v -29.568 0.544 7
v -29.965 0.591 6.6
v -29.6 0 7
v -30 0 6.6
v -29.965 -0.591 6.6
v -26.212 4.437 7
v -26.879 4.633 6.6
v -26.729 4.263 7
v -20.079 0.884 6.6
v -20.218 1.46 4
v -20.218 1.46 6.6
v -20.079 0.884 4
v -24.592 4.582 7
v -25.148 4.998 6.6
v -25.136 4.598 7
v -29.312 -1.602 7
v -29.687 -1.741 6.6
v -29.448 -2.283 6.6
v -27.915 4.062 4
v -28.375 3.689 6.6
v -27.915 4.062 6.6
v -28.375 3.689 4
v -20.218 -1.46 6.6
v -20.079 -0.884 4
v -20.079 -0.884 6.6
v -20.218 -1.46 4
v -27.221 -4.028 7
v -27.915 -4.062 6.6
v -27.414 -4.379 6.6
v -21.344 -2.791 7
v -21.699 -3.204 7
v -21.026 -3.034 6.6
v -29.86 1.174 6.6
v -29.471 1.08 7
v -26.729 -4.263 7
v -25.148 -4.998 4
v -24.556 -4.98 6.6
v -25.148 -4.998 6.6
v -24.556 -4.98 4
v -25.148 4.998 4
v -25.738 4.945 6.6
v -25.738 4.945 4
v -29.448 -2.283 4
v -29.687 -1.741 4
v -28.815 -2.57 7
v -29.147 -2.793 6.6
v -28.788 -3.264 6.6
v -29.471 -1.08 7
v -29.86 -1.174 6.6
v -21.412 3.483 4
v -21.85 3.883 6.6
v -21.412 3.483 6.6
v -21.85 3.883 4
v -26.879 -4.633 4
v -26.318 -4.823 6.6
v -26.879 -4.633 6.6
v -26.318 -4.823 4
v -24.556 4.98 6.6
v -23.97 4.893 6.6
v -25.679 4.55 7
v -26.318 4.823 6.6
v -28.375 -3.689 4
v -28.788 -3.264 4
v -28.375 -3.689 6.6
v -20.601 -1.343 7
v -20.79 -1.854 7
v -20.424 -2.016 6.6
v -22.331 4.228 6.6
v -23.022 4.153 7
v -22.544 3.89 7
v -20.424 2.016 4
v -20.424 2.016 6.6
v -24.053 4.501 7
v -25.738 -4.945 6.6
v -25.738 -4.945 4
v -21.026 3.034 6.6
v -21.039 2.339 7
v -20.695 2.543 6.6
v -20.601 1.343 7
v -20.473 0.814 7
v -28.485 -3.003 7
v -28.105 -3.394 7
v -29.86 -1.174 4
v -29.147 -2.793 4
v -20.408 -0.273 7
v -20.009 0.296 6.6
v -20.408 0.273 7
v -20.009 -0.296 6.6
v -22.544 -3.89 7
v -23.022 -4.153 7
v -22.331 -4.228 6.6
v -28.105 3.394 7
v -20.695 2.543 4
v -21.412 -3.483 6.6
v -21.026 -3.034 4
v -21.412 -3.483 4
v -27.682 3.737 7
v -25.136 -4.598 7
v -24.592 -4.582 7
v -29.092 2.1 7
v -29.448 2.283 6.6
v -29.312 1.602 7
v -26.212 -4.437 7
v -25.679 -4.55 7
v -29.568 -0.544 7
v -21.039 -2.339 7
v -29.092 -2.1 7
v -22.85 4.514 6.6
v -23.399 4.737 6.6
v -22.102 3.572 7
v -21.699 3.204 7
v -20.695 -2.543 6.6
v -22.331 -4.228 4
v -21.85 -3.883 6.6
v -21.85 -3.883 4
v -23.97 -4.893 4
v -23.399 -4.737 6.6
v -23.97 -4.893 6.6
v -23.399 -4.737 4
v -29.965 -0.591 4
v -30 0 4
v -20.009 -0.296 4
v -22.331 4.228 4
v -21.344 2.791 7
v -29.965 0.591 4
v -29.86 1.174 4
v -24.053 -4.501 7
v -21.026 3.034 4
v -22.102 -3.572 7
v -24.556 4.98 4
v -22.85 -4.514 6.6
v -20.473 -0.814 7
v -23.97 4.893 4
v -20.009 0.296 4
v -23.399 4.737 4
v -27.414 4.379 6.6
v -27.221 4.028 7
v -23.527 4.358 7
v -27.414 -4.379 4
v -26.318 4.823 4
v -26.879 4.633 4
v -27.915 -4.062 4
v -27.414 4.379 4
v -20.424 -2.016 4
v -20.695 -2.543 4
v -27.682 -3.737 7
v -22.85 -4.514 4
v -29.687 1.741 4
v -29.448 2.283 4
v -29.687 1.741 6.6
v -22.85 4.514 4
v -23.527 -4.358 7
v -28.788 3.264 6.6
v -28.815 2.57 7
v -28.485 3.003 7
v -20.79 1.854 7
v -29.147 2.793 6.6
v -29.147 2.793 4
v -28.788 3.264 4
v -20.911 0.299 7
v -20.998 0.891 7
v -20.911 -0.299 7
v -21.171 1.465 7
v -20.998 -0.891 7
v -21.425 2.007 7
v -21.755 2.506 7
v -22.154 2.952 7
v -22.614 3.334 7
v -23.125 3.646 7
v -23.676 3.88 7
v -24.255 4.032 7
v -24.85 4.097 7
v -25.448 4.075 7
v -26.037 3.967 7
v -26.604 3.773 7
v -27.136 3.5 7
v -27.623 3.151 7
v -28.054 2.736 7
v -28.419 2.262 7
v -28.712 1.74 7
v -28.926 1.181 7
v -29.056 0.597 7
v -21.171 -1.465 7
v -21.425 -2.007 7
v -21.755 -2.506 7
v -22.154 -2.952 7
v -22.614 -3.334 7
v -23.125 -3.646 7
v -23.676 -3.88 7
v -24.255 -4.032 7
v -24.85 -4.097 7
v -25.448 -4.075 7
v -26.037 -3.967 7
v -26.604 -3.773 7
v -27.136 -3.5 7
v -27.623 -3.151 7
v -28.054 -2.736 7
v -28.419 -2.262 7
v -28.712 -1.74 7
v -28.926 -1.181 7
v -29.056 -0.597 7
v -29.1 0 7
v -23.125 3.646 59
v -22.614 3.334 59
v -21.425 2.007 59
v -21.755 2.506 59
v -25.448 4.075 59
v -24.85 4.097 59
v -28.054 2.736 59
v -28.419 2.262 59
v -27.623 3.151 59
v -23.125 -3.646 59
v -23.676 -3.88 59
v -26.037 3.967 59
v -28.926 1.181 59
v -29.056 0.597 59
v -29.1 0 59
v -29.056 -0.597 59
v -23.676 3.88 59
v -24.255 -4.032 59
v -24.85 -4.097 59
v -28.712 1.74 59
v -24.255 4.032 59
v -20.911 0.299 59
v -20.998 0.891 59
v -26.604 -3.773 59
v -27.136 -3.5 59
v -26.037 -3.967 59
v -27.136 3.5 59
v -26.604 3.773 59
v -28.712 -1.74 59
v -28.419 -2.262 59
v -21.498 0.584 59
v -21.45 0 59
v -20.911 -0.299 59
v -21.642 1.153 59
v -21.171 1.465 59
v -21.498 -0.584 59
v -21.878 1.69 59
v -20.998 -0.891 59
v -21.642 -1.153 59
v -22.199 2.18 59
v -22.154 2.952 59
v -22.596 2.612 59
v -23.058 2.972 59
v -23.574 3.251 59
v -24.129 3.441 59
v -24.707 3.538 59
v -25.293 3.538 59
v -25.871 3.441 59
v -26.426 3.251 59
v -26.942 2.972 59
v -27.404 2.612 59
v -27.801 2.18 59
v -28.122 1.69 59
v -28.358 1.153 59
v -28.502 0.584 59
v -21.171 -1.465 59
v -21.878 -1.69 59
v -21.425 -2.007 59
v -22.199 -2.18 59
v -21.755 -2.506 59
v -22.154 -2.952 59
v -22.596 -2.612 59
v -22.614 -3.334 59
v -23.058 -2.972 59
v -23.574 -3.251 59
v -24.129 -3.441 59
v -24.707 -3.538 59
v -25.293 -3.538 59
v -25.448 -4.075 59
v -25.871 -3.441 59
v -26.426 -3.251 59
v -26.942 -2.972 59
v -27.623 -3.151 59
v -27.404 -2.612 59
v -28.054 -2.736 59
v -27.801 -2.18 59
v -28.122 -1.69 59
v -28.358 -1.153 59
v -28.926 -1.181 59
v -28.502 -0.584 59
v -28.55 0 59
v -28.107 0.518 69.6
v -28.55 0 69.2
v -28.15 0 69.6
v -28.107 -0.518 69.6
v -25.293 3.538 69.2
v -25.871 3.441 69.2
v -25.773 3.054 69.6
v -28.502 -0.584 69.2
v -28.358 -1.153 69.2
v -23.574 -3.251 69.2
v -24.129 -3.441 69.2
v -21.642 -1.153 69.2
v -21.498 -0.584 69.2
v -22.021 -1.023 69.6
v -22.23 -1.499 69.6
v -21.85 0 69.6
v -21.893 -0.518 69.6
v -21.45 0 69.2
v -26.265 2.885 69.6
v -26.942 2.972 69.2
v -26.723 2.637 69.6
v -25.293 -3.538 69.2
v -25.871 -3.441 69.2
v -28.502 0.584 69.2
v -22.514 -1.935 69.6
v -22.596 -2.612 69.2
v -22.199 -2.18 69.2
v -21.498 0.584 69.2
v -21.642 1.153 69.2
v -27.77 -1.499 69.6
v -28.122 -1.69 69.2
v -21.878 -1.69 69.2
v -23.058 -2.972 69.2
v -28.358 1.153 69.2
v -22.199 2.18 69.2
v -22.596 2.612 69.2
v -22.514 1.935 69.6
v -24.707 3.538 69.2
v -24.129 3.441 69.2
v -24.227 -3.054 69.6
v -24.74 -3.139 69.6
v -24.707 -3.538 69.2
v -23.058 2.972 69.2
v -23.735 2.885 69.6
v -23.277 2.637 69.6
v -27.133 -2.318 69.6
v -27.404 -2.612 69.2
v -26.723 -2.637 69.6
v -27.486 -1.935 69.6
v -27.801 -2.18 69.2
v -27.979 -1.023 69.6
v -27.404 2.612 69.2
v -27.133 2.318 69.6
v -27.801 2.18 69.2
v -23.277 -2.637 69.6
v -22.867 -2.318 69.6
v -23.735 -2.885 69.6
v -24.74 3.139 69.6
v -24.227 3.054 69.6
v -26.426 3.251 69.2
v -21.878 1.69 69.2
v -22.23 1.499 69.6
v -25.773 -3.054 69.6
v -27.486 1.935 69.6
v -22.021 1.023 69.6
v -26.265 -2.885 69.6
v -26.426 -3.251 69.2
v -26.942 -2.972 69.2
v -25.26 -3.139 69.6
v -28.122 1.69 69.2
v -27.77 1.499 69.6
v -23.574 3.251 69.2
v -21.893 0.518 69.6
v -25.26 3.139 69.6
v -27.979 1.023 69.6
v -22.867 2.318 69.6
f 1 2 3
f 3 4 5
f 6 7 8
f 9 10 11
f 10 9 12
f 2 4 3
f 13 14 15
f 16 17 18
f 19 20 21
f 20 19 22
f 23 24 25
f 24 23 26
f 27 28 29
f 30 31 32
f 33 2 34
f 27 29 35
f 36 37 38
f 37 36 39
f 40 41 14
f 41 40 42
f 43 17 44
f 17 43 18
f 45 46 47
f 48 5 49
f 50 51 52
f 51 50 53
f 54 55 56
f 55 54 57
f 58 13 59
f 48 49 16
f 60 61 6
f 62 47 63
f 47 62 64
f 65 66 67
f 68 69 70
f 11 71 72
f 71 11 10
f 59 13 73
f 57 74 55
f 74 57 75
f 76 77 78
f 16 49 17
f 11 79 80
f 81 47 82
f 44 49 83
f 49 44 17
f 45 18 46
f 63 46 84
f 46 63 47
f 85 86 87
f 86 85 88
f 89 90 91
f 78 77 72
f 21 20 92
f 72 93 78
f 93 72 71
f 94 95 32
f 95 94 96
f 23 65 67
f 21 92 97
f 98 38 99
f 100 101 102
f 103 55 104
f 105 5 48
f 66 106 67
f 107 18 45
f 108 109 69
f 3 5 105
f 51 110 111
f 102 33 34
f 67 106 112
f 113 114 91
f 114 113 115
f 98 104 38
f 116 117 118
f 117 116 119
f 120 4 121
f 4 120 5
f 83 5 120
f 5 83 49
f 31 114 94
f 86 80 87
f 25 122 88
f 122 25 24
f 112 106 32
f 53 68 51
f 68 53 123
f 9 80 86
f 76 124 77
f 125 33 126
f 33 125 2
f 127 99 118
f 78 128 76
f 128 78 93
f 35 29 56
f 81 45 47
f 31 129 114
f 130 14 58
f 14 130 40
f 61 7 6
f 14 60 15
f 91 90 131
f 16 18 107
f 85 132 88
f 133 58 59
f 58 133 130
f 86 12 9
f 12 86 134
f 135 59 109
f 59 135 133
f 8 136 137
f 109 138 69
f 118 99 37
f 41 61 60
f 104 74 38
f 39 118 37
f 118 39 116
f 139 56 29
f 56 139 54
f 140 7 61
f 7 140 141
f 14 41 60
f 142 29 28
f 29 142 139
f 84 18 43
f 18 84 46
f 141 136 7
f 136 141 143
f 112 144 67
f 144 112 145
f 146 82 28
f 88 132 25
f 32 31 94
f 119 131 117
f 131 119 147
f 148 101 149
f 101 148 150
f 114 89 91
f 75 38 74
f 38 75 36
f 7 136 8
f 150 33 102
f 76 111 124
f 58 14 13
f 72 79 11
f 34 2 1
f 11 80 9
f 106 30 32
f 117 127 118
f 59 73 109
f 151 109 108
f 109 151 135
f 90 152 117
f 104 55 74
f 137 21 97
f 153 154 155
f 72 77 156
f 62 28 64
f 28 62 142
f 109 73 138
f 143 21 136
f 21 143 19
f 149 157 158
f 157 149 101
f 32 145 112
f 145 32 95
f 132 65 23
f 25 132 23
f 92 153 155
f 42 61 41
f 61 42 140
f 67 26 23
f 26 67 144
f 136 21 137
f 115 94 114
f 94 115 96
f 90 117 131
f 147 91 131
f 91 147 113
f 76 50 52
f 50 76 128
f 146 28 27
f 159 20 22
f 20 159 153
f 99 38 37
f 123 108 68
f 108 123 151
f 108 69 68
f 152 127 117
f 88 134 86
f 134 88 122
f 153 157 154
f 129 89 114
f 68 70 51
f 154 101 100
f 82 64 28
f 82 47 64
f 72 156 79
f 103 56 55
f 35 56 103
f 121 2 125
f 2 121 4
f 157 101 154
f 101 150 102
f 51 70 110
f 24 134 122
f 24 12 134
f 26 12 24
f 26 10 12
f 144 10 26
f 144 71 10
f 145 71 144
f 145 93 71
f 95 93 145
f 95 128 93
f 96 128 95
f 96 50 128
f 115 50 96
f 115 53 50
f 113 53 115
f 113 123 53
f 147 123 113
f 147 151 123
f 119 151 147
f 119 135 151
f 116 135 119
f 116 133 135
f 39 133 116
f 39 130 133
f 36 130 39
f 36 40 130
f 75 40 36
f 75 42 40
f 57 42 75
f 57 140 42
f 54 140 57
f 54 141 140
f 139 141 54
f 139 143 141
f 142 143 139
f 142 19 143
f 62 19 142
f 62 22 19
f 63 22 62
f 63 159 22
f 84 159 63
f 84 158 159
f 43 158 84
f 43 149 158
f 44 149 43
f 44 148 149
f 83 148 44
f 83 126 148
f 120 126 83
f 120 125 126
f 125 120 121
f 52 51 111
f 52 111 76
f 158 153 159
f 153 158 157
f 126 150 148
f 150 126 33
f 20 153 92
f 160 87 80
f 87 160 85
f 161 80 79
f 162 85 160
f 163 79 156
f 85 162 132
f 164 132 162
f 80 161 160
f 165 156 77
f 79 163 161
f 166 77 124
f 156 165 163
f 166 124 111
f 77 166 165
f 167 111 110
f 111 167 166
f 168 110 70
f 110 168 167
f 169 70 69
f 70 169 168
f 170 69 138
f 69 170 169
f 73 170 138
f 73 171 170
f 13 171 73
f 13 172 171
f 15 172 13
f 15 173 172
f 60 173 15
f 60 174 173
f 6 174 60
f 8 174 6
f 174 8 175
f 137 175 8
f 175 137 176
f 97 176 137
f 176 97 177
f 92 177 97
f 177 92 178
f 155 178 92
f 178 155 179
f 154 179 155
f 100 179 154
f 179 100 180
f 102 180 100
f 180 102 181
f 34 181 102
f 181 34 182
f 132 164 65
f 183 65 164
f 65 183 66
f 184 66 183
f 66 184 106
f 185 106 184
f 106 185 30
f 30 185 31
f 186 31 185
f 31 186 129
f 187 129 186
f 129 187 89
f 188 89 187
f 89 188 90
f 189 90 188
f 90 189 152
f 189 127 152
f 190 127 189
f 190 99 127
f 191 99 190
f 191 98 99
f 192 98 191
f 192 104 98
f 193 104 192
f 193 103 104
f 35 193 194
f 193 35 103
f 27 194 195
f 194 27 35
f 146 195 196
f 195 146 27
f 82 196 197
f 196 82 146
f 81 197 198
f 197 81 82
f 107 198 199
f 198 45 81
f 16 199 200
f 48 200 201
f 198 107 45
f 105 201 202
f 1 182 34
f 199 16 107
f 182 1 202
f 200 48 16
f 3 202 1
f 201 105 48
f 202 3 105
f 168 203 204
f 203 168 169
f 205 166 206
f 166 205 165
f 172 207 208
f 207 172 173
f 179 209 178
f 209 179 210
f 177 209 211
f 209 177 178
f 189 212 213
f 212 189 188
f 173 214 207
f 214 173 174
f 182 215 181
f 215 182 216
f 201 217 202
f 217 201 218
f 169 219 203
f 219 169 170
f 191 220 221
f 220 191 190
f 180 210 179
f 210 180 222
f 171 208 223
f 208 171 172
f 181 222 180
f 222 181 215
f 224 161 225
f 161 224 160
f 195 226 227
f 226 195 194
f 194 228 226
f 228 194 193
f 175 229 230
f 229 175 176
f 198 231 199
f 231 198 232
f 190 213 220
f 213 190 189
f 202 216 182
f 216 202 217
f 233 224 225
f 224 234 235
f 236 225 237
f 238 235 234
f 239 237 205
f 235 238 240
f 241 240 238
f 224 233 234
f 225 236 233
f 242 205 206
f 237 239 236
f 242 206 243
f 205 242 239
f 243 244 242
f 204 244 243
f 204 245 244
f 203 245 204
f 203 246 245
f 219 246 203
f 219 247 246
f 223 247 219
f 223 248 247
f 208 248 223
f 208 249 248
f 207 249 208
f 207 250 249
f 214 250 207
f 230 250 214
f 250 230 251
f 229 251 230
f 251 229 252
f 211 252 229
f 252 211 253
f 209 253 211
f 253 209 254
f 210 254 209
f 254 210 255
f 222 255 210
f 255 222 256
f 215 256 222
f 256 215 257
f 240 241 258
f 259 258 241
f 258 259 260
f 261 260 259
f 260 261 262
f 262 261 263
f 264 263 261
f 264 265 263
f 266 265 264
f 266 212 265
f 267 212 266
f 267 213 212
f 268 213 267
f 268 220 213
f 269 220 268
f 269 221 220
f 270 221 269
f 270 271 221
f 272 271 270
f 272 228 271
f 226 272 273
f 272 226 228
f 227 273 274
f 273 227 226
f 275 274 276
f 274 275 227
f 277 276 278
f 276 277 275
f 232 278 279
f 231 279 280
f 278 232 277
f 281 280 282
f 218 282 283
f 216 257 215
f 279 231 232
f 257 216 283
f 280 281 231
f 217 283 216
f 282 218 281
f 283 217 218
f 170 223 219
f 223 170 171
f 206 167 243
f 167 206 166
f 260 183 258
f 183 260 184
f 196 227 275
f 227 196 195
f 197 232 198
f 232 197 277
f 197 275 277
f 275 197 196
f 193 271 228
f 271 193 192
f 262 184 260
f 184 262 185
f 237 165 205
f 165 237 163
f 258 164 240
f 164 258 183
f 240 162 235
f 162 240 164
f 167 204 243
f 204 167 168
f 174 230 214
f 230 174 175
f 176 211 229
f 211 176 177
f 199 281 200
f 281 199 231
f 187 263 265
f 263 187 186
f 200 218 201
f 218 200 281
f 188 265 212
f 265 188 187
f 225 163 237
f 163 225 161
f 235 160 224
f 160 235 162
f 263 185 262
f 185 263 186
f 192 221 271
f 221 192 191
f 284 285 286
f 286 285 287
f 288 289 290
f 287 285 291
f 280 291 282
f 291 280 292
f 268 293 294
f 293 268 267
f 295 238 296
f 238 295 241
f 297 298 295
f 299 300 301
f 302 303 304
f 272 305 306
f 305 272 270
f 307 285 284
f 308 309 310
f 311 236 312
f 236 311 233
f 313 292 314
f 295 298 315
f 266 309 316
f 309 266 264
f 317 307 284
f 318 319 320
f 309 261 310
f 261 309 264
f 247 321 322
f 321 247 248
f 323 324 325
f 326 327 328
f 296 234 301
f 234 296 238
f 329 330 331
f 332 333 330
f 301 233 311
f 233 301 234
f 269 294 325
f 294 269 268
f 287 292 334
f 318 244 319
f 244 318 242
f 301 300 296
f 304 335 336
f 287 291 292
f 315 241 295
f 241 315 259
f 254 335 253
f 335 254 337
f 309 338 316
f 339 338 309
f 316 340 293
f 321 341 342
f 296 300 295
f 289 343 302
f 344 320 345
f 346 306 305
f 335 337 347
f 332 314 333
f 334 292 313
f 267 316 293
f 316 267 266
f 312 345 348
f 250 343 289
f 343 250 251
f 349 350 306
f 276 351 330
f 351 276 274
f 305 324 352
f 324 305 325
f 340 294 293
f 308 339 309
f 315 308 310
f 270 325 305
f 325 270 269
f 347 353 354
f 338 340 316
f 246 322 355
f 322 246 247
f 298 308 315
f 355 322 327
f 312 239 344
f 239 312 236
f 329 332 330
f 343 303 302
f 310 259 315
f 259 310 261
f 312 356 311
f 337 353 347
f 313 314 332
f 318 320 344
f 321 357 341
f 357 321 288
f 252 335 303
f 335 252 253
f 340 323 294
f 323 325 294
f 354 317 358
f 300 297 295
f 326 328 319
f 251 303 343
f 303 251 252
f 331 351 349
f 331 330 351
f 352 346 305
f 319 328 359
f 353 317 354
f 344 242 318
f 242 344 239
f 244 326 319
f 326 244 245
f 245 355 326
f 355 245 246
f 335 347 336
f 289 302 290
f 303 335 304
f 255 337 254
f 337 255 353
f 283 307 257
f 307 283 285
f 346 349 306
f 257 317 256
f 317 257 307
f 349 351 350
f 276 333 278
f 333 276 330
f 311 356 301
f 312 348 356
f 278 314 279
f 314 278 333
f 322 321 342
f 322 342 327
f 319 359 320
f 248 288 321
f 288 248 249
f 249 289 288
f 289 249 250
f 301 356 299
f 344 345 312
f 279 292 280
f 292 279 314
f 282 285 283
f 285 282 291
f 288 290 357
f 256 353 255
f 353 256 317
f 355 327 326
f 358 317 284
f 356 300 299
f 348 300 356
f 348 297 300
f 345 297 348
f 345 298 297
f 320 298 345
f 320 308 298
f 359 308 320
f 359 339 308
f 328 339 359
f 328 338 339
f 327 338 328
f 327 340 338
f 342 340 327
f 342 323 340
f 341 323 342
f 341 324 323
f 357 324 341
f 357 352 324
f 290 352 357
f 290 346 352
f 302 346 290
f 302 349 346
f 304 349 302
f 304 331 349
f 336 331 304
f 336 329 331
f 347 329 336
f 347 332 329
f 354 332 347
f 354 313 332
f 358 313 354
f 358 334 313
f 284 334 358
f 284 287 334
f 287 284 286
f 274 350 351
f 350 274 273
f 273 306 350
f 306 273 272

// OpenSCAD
// file: ../drive_lib.scad
// ============================================================================
//  Вспомогательные модули модуля вращения (шкивы).
//  Подключать через use <../drive_lib.scad>.
// ============================================================================

include <drive_params.scad>
use <../lib/common.scad>

// Канавка под квадратный пассик: трапеция со дном чуть шире пассика и
// разведёнными стенками — пассик сам садится на дно.
module sq_belt_groove(od) {
    wb = belt_t + 0.2;
    wt = wb/2 + (pulley_groove_h + 0.5)*tan(30);
    rotate_extrude(angle = 360) polygon([
        [od/2 - pulley_groove_h, -wb/2],
        [od/2 - pulley_groove_h,  wb/2],
        [od/2 + 0.5,  wt],
        [od/2 + 0.5, -wt]]);
}

// Колесо без ступицы: обод с канавкой посередине, диск с окнами.
// web_top — диск у верхнего края обода (иначе у нижнего).
module pulley_wheel(od, web_top = false) {
    rim_id = od - 2*pulley_rim_w;
    win_r  = (rim_id/2 + pulley_hub_d/2)/2;
    win_d  = rim_id/2 - pulley_hub_d/2 - 5;
    difference() {
        union() {
            tube(od, rim_id, pulley_t);
            translate([0, 0, web_top ? pulley_t - pulley_web_t : 0])
                cylinder(d = rim_id + 1, h = pulley_web_t);
        }
        translate([0, 0, pulley_t/2]) sq_belt_groove(od);
        if (win_d > 6)
            translate([0, 0, web_top ? pulley_t - pulley_web_t : 0])
                radial_holes(5, win_r, win_d, pulley_web_t);
    }
}

// Отверстие под стопорный винт M3 в ступице, на высоте z от её низа
module set_screw_hole(z) translate([0, 0, z]) rotate([0, 90, 0])
    cylinder(d = scr3_pilot, h = pulley_hub_d);

// Лыска под стопорный винт на печатном валу. z, az — в координатах сборки
// относительно оси вала (z абсолютный).
module shaft_flat(z, az = 0)
    rotate([0, 0, az])
        translate([rod_print_d/2 - rod_flat_d, -rod_flat_w/2, z - rod_flat_len/2])
            cube([rod_flat_d + 2, rod_flat_w, rod_flat_len]);

// Тело печатного вала на оси [0,0]: буртик-упор снизу, опциональный
// кончик под отверстие пластинки. z — абсолютные координаты сборки.
module printed_shaft_body(top_z, tip_len = 0) {
    body_h = top_z - rod_bottom_z - tip_len;
    translate([0, 0, rod_bottom_z]) {
        chamfered_cyl(stop_ring_d, rod_bottom_gap, ch = 0.4, bottom = false);
        chamfered_cyl(rod_print_d, body_h, ch = 0.4, bottom = false,
                      top = tip_len <= 0);
        if (tip_len > 0)
            translate([0, 0, body_h])
                chamfered_cyl(spindle_tip_d, tip_len, ch = 0.4, bottom = false);
    }
}
// file: ../../lib/common.scad
// ============================================================================
//  Вспомогательные модули общего назначения.
//  Подключать через use <lib/common.scad> — файл не содержит параметров
//  проекта и ни от чего не зависит.
// ============================================================================

_eps = 0.01;

// --------------------------------------------------------------------- 2D ---
// Прямоугольник со скруглёнными углами, по центру
module rrect(w, d, r) {
    rr = min(r, w/2 - _eps, d/2 - _eps);
    if (rr > 0) offset(r = rr) square([w - 2*rr, d - 2*rr], center = true);
    else square([w, d], center = true);
}

// --------------------------------------------------------------------- 3D ---
// Коробка со скруглением ТОЛЬКО вертикальных рёбер: нижние и верхние острые
module rounded_box(w, d, h, r) linear_extrude(height = h) rrect(w, d, r);

// Цилиндр с фасками на торцах (снимает «слоновью ногу» и облегчает посадку)
module chamfered_cyl(d, h, ch = 0.6, bottom = true, top = true) {
    r  = d/2;
    cb = bottom ? min(ch, h/2) : 0;
    ct = top    ? min(ch, h/2) : 0;
    if (cb <= 0 && ct <= 0) cylinder(d = d, h = h);
    else rotate_extrude(angle = 360) polygon(concat(
        [[0, 0]],
        cb > 0 ? [[r - cb, 0], [r, cb]] : [[r, 0]],
        ct > 0 ? [[r, h - ct], [r - ct, h]] : [[r, h]],
        [[0, h]]));
}

// Труба
module tube(od, id, h) difference() {
    cylinder(d = od, h = h);
    translate([0, 0, -_eps]) cylinder(d = id, h = h + 2*_eps);
}

// Сквозное отверстие, растянутое вверх-вниз для гарантированного вычитания
module thru(d, h) translate([0, 0, -_eps]) cylinder(d = d, h = h + 2*_eps);

// Потайное отверстие под саморез с конической головкой.
// Пластина занимает z = [0 .. t], головка утапливается сверху,
// саморез идёт вниз (в ответную стойку).
module countersunk_hole(free_d, head_d, t, down = 30) {
    cone_h = (head_d - free_d)/2;    // головка 90 градусов
    union() {
        translate([0, 0, -down]) cylinder(d = free_d, h = down + t - cone_h + _eps);
        translate([0, 0, t - cone_h]) cylinder(d1 = free_d, d2 = head_d, h = cone_h);
    }
}

// Паз (щелевое отверстие) длиной len по X, сквозной по высоте h
module slot(len, d, h) hull() for (s = [-1, 1])
    translate([s*(len - d)/2, 0, 0]) cylinder(d = d, h = h);

// Стойка под саморез: цилиндр с пилотным отверстием сверху.
// Снизу фаски нет — стойка растёт из дна детали.
module screw_boss(od, h, pilot_d, pilot_depth, ch = 0.6) difference() {
    chamfered_cyl(od, h, ch = ch, bottom = false, top = true);
    translate([0, 0, h - pilot_depth]) cylinder(d = pilot_d, h = pilot_depth + _eps);
}

// Треугольная косынка в плоскости XZ (катеты l по X и h по Z), толщина t по Y
module gusset(l, h, t) translate([0, -t/2, 0]) linear_extrude(height = t)
    polygon([[0, 0], [l, 0], [0, h]]);

// Конусное гнездо под заточенный винт-ось (ось Z вниз от z=0)
module cone_seat(d, depth) translate([0, 0, -depth])
    cylinder(d1 = 0.2, d2 = d, h = depth + _eps);

// Канавка под круглый пассик: тор, вычитаемый из обода
module belt_groove(pulley_d, groove_r) rotate_extrude(angle = 360)
    translate([pulley_d/2, 0]) circle(r = groove_r);

// Сетка облегчающих отверстий по кругу
module radial_holes(n, r, d, h) for (i = [0 : n - 1])
    rotate([0, 0, i*360/n]) translate([r, 0, 0]) thru(d, h);
// main file
// ============================================================================
//  ВАЛ ДИСКА — печатный, вместо стального прутка 8 мм
//
//  Тело с компенсацией печати (rod_print_clr). Кончик 7.1 мм проверен
//  — не менять.
//  Снизу буртик вместо термоусадки: упирается во внутреннее кольцо нижнего
//  подшипника и не даёт вытянуть вал вверх вместе с диском.
//  Сверху ступенька на 7.1 мм — центрирующий штырь под отверстие пластинки
//  (~7.2 мм). Ступенька прячется в ступице диска под матом. Колесо на
//  прототипе клеится; лыски под винты — rod_set_screws в drive_params.scad.
//
//  Печать: стоя, буртиком на стол, 100% заполнение. Посадку в подшипник
//  правит rod_print_clr — проще напечатать короткий обломок и подобрать.
// ============================================================================

include <../drive_params.scad>
use <../../lib/common.scad>
use <../drive_lib.scad>

module drive_spindle_shaft() {
    translate([spindle_pos[0], spindle_pos[1], 0]) difference() {
        printed_shaft_body(spindle_top_z, spindle_tip_len);
        if (rod_set_screws) {
            shaft_flat(spindle_set_z);
            shaft_flat(platter_set_z, 180/platter_spokes);
        }
    }
}

drive_spindle_shaft();
